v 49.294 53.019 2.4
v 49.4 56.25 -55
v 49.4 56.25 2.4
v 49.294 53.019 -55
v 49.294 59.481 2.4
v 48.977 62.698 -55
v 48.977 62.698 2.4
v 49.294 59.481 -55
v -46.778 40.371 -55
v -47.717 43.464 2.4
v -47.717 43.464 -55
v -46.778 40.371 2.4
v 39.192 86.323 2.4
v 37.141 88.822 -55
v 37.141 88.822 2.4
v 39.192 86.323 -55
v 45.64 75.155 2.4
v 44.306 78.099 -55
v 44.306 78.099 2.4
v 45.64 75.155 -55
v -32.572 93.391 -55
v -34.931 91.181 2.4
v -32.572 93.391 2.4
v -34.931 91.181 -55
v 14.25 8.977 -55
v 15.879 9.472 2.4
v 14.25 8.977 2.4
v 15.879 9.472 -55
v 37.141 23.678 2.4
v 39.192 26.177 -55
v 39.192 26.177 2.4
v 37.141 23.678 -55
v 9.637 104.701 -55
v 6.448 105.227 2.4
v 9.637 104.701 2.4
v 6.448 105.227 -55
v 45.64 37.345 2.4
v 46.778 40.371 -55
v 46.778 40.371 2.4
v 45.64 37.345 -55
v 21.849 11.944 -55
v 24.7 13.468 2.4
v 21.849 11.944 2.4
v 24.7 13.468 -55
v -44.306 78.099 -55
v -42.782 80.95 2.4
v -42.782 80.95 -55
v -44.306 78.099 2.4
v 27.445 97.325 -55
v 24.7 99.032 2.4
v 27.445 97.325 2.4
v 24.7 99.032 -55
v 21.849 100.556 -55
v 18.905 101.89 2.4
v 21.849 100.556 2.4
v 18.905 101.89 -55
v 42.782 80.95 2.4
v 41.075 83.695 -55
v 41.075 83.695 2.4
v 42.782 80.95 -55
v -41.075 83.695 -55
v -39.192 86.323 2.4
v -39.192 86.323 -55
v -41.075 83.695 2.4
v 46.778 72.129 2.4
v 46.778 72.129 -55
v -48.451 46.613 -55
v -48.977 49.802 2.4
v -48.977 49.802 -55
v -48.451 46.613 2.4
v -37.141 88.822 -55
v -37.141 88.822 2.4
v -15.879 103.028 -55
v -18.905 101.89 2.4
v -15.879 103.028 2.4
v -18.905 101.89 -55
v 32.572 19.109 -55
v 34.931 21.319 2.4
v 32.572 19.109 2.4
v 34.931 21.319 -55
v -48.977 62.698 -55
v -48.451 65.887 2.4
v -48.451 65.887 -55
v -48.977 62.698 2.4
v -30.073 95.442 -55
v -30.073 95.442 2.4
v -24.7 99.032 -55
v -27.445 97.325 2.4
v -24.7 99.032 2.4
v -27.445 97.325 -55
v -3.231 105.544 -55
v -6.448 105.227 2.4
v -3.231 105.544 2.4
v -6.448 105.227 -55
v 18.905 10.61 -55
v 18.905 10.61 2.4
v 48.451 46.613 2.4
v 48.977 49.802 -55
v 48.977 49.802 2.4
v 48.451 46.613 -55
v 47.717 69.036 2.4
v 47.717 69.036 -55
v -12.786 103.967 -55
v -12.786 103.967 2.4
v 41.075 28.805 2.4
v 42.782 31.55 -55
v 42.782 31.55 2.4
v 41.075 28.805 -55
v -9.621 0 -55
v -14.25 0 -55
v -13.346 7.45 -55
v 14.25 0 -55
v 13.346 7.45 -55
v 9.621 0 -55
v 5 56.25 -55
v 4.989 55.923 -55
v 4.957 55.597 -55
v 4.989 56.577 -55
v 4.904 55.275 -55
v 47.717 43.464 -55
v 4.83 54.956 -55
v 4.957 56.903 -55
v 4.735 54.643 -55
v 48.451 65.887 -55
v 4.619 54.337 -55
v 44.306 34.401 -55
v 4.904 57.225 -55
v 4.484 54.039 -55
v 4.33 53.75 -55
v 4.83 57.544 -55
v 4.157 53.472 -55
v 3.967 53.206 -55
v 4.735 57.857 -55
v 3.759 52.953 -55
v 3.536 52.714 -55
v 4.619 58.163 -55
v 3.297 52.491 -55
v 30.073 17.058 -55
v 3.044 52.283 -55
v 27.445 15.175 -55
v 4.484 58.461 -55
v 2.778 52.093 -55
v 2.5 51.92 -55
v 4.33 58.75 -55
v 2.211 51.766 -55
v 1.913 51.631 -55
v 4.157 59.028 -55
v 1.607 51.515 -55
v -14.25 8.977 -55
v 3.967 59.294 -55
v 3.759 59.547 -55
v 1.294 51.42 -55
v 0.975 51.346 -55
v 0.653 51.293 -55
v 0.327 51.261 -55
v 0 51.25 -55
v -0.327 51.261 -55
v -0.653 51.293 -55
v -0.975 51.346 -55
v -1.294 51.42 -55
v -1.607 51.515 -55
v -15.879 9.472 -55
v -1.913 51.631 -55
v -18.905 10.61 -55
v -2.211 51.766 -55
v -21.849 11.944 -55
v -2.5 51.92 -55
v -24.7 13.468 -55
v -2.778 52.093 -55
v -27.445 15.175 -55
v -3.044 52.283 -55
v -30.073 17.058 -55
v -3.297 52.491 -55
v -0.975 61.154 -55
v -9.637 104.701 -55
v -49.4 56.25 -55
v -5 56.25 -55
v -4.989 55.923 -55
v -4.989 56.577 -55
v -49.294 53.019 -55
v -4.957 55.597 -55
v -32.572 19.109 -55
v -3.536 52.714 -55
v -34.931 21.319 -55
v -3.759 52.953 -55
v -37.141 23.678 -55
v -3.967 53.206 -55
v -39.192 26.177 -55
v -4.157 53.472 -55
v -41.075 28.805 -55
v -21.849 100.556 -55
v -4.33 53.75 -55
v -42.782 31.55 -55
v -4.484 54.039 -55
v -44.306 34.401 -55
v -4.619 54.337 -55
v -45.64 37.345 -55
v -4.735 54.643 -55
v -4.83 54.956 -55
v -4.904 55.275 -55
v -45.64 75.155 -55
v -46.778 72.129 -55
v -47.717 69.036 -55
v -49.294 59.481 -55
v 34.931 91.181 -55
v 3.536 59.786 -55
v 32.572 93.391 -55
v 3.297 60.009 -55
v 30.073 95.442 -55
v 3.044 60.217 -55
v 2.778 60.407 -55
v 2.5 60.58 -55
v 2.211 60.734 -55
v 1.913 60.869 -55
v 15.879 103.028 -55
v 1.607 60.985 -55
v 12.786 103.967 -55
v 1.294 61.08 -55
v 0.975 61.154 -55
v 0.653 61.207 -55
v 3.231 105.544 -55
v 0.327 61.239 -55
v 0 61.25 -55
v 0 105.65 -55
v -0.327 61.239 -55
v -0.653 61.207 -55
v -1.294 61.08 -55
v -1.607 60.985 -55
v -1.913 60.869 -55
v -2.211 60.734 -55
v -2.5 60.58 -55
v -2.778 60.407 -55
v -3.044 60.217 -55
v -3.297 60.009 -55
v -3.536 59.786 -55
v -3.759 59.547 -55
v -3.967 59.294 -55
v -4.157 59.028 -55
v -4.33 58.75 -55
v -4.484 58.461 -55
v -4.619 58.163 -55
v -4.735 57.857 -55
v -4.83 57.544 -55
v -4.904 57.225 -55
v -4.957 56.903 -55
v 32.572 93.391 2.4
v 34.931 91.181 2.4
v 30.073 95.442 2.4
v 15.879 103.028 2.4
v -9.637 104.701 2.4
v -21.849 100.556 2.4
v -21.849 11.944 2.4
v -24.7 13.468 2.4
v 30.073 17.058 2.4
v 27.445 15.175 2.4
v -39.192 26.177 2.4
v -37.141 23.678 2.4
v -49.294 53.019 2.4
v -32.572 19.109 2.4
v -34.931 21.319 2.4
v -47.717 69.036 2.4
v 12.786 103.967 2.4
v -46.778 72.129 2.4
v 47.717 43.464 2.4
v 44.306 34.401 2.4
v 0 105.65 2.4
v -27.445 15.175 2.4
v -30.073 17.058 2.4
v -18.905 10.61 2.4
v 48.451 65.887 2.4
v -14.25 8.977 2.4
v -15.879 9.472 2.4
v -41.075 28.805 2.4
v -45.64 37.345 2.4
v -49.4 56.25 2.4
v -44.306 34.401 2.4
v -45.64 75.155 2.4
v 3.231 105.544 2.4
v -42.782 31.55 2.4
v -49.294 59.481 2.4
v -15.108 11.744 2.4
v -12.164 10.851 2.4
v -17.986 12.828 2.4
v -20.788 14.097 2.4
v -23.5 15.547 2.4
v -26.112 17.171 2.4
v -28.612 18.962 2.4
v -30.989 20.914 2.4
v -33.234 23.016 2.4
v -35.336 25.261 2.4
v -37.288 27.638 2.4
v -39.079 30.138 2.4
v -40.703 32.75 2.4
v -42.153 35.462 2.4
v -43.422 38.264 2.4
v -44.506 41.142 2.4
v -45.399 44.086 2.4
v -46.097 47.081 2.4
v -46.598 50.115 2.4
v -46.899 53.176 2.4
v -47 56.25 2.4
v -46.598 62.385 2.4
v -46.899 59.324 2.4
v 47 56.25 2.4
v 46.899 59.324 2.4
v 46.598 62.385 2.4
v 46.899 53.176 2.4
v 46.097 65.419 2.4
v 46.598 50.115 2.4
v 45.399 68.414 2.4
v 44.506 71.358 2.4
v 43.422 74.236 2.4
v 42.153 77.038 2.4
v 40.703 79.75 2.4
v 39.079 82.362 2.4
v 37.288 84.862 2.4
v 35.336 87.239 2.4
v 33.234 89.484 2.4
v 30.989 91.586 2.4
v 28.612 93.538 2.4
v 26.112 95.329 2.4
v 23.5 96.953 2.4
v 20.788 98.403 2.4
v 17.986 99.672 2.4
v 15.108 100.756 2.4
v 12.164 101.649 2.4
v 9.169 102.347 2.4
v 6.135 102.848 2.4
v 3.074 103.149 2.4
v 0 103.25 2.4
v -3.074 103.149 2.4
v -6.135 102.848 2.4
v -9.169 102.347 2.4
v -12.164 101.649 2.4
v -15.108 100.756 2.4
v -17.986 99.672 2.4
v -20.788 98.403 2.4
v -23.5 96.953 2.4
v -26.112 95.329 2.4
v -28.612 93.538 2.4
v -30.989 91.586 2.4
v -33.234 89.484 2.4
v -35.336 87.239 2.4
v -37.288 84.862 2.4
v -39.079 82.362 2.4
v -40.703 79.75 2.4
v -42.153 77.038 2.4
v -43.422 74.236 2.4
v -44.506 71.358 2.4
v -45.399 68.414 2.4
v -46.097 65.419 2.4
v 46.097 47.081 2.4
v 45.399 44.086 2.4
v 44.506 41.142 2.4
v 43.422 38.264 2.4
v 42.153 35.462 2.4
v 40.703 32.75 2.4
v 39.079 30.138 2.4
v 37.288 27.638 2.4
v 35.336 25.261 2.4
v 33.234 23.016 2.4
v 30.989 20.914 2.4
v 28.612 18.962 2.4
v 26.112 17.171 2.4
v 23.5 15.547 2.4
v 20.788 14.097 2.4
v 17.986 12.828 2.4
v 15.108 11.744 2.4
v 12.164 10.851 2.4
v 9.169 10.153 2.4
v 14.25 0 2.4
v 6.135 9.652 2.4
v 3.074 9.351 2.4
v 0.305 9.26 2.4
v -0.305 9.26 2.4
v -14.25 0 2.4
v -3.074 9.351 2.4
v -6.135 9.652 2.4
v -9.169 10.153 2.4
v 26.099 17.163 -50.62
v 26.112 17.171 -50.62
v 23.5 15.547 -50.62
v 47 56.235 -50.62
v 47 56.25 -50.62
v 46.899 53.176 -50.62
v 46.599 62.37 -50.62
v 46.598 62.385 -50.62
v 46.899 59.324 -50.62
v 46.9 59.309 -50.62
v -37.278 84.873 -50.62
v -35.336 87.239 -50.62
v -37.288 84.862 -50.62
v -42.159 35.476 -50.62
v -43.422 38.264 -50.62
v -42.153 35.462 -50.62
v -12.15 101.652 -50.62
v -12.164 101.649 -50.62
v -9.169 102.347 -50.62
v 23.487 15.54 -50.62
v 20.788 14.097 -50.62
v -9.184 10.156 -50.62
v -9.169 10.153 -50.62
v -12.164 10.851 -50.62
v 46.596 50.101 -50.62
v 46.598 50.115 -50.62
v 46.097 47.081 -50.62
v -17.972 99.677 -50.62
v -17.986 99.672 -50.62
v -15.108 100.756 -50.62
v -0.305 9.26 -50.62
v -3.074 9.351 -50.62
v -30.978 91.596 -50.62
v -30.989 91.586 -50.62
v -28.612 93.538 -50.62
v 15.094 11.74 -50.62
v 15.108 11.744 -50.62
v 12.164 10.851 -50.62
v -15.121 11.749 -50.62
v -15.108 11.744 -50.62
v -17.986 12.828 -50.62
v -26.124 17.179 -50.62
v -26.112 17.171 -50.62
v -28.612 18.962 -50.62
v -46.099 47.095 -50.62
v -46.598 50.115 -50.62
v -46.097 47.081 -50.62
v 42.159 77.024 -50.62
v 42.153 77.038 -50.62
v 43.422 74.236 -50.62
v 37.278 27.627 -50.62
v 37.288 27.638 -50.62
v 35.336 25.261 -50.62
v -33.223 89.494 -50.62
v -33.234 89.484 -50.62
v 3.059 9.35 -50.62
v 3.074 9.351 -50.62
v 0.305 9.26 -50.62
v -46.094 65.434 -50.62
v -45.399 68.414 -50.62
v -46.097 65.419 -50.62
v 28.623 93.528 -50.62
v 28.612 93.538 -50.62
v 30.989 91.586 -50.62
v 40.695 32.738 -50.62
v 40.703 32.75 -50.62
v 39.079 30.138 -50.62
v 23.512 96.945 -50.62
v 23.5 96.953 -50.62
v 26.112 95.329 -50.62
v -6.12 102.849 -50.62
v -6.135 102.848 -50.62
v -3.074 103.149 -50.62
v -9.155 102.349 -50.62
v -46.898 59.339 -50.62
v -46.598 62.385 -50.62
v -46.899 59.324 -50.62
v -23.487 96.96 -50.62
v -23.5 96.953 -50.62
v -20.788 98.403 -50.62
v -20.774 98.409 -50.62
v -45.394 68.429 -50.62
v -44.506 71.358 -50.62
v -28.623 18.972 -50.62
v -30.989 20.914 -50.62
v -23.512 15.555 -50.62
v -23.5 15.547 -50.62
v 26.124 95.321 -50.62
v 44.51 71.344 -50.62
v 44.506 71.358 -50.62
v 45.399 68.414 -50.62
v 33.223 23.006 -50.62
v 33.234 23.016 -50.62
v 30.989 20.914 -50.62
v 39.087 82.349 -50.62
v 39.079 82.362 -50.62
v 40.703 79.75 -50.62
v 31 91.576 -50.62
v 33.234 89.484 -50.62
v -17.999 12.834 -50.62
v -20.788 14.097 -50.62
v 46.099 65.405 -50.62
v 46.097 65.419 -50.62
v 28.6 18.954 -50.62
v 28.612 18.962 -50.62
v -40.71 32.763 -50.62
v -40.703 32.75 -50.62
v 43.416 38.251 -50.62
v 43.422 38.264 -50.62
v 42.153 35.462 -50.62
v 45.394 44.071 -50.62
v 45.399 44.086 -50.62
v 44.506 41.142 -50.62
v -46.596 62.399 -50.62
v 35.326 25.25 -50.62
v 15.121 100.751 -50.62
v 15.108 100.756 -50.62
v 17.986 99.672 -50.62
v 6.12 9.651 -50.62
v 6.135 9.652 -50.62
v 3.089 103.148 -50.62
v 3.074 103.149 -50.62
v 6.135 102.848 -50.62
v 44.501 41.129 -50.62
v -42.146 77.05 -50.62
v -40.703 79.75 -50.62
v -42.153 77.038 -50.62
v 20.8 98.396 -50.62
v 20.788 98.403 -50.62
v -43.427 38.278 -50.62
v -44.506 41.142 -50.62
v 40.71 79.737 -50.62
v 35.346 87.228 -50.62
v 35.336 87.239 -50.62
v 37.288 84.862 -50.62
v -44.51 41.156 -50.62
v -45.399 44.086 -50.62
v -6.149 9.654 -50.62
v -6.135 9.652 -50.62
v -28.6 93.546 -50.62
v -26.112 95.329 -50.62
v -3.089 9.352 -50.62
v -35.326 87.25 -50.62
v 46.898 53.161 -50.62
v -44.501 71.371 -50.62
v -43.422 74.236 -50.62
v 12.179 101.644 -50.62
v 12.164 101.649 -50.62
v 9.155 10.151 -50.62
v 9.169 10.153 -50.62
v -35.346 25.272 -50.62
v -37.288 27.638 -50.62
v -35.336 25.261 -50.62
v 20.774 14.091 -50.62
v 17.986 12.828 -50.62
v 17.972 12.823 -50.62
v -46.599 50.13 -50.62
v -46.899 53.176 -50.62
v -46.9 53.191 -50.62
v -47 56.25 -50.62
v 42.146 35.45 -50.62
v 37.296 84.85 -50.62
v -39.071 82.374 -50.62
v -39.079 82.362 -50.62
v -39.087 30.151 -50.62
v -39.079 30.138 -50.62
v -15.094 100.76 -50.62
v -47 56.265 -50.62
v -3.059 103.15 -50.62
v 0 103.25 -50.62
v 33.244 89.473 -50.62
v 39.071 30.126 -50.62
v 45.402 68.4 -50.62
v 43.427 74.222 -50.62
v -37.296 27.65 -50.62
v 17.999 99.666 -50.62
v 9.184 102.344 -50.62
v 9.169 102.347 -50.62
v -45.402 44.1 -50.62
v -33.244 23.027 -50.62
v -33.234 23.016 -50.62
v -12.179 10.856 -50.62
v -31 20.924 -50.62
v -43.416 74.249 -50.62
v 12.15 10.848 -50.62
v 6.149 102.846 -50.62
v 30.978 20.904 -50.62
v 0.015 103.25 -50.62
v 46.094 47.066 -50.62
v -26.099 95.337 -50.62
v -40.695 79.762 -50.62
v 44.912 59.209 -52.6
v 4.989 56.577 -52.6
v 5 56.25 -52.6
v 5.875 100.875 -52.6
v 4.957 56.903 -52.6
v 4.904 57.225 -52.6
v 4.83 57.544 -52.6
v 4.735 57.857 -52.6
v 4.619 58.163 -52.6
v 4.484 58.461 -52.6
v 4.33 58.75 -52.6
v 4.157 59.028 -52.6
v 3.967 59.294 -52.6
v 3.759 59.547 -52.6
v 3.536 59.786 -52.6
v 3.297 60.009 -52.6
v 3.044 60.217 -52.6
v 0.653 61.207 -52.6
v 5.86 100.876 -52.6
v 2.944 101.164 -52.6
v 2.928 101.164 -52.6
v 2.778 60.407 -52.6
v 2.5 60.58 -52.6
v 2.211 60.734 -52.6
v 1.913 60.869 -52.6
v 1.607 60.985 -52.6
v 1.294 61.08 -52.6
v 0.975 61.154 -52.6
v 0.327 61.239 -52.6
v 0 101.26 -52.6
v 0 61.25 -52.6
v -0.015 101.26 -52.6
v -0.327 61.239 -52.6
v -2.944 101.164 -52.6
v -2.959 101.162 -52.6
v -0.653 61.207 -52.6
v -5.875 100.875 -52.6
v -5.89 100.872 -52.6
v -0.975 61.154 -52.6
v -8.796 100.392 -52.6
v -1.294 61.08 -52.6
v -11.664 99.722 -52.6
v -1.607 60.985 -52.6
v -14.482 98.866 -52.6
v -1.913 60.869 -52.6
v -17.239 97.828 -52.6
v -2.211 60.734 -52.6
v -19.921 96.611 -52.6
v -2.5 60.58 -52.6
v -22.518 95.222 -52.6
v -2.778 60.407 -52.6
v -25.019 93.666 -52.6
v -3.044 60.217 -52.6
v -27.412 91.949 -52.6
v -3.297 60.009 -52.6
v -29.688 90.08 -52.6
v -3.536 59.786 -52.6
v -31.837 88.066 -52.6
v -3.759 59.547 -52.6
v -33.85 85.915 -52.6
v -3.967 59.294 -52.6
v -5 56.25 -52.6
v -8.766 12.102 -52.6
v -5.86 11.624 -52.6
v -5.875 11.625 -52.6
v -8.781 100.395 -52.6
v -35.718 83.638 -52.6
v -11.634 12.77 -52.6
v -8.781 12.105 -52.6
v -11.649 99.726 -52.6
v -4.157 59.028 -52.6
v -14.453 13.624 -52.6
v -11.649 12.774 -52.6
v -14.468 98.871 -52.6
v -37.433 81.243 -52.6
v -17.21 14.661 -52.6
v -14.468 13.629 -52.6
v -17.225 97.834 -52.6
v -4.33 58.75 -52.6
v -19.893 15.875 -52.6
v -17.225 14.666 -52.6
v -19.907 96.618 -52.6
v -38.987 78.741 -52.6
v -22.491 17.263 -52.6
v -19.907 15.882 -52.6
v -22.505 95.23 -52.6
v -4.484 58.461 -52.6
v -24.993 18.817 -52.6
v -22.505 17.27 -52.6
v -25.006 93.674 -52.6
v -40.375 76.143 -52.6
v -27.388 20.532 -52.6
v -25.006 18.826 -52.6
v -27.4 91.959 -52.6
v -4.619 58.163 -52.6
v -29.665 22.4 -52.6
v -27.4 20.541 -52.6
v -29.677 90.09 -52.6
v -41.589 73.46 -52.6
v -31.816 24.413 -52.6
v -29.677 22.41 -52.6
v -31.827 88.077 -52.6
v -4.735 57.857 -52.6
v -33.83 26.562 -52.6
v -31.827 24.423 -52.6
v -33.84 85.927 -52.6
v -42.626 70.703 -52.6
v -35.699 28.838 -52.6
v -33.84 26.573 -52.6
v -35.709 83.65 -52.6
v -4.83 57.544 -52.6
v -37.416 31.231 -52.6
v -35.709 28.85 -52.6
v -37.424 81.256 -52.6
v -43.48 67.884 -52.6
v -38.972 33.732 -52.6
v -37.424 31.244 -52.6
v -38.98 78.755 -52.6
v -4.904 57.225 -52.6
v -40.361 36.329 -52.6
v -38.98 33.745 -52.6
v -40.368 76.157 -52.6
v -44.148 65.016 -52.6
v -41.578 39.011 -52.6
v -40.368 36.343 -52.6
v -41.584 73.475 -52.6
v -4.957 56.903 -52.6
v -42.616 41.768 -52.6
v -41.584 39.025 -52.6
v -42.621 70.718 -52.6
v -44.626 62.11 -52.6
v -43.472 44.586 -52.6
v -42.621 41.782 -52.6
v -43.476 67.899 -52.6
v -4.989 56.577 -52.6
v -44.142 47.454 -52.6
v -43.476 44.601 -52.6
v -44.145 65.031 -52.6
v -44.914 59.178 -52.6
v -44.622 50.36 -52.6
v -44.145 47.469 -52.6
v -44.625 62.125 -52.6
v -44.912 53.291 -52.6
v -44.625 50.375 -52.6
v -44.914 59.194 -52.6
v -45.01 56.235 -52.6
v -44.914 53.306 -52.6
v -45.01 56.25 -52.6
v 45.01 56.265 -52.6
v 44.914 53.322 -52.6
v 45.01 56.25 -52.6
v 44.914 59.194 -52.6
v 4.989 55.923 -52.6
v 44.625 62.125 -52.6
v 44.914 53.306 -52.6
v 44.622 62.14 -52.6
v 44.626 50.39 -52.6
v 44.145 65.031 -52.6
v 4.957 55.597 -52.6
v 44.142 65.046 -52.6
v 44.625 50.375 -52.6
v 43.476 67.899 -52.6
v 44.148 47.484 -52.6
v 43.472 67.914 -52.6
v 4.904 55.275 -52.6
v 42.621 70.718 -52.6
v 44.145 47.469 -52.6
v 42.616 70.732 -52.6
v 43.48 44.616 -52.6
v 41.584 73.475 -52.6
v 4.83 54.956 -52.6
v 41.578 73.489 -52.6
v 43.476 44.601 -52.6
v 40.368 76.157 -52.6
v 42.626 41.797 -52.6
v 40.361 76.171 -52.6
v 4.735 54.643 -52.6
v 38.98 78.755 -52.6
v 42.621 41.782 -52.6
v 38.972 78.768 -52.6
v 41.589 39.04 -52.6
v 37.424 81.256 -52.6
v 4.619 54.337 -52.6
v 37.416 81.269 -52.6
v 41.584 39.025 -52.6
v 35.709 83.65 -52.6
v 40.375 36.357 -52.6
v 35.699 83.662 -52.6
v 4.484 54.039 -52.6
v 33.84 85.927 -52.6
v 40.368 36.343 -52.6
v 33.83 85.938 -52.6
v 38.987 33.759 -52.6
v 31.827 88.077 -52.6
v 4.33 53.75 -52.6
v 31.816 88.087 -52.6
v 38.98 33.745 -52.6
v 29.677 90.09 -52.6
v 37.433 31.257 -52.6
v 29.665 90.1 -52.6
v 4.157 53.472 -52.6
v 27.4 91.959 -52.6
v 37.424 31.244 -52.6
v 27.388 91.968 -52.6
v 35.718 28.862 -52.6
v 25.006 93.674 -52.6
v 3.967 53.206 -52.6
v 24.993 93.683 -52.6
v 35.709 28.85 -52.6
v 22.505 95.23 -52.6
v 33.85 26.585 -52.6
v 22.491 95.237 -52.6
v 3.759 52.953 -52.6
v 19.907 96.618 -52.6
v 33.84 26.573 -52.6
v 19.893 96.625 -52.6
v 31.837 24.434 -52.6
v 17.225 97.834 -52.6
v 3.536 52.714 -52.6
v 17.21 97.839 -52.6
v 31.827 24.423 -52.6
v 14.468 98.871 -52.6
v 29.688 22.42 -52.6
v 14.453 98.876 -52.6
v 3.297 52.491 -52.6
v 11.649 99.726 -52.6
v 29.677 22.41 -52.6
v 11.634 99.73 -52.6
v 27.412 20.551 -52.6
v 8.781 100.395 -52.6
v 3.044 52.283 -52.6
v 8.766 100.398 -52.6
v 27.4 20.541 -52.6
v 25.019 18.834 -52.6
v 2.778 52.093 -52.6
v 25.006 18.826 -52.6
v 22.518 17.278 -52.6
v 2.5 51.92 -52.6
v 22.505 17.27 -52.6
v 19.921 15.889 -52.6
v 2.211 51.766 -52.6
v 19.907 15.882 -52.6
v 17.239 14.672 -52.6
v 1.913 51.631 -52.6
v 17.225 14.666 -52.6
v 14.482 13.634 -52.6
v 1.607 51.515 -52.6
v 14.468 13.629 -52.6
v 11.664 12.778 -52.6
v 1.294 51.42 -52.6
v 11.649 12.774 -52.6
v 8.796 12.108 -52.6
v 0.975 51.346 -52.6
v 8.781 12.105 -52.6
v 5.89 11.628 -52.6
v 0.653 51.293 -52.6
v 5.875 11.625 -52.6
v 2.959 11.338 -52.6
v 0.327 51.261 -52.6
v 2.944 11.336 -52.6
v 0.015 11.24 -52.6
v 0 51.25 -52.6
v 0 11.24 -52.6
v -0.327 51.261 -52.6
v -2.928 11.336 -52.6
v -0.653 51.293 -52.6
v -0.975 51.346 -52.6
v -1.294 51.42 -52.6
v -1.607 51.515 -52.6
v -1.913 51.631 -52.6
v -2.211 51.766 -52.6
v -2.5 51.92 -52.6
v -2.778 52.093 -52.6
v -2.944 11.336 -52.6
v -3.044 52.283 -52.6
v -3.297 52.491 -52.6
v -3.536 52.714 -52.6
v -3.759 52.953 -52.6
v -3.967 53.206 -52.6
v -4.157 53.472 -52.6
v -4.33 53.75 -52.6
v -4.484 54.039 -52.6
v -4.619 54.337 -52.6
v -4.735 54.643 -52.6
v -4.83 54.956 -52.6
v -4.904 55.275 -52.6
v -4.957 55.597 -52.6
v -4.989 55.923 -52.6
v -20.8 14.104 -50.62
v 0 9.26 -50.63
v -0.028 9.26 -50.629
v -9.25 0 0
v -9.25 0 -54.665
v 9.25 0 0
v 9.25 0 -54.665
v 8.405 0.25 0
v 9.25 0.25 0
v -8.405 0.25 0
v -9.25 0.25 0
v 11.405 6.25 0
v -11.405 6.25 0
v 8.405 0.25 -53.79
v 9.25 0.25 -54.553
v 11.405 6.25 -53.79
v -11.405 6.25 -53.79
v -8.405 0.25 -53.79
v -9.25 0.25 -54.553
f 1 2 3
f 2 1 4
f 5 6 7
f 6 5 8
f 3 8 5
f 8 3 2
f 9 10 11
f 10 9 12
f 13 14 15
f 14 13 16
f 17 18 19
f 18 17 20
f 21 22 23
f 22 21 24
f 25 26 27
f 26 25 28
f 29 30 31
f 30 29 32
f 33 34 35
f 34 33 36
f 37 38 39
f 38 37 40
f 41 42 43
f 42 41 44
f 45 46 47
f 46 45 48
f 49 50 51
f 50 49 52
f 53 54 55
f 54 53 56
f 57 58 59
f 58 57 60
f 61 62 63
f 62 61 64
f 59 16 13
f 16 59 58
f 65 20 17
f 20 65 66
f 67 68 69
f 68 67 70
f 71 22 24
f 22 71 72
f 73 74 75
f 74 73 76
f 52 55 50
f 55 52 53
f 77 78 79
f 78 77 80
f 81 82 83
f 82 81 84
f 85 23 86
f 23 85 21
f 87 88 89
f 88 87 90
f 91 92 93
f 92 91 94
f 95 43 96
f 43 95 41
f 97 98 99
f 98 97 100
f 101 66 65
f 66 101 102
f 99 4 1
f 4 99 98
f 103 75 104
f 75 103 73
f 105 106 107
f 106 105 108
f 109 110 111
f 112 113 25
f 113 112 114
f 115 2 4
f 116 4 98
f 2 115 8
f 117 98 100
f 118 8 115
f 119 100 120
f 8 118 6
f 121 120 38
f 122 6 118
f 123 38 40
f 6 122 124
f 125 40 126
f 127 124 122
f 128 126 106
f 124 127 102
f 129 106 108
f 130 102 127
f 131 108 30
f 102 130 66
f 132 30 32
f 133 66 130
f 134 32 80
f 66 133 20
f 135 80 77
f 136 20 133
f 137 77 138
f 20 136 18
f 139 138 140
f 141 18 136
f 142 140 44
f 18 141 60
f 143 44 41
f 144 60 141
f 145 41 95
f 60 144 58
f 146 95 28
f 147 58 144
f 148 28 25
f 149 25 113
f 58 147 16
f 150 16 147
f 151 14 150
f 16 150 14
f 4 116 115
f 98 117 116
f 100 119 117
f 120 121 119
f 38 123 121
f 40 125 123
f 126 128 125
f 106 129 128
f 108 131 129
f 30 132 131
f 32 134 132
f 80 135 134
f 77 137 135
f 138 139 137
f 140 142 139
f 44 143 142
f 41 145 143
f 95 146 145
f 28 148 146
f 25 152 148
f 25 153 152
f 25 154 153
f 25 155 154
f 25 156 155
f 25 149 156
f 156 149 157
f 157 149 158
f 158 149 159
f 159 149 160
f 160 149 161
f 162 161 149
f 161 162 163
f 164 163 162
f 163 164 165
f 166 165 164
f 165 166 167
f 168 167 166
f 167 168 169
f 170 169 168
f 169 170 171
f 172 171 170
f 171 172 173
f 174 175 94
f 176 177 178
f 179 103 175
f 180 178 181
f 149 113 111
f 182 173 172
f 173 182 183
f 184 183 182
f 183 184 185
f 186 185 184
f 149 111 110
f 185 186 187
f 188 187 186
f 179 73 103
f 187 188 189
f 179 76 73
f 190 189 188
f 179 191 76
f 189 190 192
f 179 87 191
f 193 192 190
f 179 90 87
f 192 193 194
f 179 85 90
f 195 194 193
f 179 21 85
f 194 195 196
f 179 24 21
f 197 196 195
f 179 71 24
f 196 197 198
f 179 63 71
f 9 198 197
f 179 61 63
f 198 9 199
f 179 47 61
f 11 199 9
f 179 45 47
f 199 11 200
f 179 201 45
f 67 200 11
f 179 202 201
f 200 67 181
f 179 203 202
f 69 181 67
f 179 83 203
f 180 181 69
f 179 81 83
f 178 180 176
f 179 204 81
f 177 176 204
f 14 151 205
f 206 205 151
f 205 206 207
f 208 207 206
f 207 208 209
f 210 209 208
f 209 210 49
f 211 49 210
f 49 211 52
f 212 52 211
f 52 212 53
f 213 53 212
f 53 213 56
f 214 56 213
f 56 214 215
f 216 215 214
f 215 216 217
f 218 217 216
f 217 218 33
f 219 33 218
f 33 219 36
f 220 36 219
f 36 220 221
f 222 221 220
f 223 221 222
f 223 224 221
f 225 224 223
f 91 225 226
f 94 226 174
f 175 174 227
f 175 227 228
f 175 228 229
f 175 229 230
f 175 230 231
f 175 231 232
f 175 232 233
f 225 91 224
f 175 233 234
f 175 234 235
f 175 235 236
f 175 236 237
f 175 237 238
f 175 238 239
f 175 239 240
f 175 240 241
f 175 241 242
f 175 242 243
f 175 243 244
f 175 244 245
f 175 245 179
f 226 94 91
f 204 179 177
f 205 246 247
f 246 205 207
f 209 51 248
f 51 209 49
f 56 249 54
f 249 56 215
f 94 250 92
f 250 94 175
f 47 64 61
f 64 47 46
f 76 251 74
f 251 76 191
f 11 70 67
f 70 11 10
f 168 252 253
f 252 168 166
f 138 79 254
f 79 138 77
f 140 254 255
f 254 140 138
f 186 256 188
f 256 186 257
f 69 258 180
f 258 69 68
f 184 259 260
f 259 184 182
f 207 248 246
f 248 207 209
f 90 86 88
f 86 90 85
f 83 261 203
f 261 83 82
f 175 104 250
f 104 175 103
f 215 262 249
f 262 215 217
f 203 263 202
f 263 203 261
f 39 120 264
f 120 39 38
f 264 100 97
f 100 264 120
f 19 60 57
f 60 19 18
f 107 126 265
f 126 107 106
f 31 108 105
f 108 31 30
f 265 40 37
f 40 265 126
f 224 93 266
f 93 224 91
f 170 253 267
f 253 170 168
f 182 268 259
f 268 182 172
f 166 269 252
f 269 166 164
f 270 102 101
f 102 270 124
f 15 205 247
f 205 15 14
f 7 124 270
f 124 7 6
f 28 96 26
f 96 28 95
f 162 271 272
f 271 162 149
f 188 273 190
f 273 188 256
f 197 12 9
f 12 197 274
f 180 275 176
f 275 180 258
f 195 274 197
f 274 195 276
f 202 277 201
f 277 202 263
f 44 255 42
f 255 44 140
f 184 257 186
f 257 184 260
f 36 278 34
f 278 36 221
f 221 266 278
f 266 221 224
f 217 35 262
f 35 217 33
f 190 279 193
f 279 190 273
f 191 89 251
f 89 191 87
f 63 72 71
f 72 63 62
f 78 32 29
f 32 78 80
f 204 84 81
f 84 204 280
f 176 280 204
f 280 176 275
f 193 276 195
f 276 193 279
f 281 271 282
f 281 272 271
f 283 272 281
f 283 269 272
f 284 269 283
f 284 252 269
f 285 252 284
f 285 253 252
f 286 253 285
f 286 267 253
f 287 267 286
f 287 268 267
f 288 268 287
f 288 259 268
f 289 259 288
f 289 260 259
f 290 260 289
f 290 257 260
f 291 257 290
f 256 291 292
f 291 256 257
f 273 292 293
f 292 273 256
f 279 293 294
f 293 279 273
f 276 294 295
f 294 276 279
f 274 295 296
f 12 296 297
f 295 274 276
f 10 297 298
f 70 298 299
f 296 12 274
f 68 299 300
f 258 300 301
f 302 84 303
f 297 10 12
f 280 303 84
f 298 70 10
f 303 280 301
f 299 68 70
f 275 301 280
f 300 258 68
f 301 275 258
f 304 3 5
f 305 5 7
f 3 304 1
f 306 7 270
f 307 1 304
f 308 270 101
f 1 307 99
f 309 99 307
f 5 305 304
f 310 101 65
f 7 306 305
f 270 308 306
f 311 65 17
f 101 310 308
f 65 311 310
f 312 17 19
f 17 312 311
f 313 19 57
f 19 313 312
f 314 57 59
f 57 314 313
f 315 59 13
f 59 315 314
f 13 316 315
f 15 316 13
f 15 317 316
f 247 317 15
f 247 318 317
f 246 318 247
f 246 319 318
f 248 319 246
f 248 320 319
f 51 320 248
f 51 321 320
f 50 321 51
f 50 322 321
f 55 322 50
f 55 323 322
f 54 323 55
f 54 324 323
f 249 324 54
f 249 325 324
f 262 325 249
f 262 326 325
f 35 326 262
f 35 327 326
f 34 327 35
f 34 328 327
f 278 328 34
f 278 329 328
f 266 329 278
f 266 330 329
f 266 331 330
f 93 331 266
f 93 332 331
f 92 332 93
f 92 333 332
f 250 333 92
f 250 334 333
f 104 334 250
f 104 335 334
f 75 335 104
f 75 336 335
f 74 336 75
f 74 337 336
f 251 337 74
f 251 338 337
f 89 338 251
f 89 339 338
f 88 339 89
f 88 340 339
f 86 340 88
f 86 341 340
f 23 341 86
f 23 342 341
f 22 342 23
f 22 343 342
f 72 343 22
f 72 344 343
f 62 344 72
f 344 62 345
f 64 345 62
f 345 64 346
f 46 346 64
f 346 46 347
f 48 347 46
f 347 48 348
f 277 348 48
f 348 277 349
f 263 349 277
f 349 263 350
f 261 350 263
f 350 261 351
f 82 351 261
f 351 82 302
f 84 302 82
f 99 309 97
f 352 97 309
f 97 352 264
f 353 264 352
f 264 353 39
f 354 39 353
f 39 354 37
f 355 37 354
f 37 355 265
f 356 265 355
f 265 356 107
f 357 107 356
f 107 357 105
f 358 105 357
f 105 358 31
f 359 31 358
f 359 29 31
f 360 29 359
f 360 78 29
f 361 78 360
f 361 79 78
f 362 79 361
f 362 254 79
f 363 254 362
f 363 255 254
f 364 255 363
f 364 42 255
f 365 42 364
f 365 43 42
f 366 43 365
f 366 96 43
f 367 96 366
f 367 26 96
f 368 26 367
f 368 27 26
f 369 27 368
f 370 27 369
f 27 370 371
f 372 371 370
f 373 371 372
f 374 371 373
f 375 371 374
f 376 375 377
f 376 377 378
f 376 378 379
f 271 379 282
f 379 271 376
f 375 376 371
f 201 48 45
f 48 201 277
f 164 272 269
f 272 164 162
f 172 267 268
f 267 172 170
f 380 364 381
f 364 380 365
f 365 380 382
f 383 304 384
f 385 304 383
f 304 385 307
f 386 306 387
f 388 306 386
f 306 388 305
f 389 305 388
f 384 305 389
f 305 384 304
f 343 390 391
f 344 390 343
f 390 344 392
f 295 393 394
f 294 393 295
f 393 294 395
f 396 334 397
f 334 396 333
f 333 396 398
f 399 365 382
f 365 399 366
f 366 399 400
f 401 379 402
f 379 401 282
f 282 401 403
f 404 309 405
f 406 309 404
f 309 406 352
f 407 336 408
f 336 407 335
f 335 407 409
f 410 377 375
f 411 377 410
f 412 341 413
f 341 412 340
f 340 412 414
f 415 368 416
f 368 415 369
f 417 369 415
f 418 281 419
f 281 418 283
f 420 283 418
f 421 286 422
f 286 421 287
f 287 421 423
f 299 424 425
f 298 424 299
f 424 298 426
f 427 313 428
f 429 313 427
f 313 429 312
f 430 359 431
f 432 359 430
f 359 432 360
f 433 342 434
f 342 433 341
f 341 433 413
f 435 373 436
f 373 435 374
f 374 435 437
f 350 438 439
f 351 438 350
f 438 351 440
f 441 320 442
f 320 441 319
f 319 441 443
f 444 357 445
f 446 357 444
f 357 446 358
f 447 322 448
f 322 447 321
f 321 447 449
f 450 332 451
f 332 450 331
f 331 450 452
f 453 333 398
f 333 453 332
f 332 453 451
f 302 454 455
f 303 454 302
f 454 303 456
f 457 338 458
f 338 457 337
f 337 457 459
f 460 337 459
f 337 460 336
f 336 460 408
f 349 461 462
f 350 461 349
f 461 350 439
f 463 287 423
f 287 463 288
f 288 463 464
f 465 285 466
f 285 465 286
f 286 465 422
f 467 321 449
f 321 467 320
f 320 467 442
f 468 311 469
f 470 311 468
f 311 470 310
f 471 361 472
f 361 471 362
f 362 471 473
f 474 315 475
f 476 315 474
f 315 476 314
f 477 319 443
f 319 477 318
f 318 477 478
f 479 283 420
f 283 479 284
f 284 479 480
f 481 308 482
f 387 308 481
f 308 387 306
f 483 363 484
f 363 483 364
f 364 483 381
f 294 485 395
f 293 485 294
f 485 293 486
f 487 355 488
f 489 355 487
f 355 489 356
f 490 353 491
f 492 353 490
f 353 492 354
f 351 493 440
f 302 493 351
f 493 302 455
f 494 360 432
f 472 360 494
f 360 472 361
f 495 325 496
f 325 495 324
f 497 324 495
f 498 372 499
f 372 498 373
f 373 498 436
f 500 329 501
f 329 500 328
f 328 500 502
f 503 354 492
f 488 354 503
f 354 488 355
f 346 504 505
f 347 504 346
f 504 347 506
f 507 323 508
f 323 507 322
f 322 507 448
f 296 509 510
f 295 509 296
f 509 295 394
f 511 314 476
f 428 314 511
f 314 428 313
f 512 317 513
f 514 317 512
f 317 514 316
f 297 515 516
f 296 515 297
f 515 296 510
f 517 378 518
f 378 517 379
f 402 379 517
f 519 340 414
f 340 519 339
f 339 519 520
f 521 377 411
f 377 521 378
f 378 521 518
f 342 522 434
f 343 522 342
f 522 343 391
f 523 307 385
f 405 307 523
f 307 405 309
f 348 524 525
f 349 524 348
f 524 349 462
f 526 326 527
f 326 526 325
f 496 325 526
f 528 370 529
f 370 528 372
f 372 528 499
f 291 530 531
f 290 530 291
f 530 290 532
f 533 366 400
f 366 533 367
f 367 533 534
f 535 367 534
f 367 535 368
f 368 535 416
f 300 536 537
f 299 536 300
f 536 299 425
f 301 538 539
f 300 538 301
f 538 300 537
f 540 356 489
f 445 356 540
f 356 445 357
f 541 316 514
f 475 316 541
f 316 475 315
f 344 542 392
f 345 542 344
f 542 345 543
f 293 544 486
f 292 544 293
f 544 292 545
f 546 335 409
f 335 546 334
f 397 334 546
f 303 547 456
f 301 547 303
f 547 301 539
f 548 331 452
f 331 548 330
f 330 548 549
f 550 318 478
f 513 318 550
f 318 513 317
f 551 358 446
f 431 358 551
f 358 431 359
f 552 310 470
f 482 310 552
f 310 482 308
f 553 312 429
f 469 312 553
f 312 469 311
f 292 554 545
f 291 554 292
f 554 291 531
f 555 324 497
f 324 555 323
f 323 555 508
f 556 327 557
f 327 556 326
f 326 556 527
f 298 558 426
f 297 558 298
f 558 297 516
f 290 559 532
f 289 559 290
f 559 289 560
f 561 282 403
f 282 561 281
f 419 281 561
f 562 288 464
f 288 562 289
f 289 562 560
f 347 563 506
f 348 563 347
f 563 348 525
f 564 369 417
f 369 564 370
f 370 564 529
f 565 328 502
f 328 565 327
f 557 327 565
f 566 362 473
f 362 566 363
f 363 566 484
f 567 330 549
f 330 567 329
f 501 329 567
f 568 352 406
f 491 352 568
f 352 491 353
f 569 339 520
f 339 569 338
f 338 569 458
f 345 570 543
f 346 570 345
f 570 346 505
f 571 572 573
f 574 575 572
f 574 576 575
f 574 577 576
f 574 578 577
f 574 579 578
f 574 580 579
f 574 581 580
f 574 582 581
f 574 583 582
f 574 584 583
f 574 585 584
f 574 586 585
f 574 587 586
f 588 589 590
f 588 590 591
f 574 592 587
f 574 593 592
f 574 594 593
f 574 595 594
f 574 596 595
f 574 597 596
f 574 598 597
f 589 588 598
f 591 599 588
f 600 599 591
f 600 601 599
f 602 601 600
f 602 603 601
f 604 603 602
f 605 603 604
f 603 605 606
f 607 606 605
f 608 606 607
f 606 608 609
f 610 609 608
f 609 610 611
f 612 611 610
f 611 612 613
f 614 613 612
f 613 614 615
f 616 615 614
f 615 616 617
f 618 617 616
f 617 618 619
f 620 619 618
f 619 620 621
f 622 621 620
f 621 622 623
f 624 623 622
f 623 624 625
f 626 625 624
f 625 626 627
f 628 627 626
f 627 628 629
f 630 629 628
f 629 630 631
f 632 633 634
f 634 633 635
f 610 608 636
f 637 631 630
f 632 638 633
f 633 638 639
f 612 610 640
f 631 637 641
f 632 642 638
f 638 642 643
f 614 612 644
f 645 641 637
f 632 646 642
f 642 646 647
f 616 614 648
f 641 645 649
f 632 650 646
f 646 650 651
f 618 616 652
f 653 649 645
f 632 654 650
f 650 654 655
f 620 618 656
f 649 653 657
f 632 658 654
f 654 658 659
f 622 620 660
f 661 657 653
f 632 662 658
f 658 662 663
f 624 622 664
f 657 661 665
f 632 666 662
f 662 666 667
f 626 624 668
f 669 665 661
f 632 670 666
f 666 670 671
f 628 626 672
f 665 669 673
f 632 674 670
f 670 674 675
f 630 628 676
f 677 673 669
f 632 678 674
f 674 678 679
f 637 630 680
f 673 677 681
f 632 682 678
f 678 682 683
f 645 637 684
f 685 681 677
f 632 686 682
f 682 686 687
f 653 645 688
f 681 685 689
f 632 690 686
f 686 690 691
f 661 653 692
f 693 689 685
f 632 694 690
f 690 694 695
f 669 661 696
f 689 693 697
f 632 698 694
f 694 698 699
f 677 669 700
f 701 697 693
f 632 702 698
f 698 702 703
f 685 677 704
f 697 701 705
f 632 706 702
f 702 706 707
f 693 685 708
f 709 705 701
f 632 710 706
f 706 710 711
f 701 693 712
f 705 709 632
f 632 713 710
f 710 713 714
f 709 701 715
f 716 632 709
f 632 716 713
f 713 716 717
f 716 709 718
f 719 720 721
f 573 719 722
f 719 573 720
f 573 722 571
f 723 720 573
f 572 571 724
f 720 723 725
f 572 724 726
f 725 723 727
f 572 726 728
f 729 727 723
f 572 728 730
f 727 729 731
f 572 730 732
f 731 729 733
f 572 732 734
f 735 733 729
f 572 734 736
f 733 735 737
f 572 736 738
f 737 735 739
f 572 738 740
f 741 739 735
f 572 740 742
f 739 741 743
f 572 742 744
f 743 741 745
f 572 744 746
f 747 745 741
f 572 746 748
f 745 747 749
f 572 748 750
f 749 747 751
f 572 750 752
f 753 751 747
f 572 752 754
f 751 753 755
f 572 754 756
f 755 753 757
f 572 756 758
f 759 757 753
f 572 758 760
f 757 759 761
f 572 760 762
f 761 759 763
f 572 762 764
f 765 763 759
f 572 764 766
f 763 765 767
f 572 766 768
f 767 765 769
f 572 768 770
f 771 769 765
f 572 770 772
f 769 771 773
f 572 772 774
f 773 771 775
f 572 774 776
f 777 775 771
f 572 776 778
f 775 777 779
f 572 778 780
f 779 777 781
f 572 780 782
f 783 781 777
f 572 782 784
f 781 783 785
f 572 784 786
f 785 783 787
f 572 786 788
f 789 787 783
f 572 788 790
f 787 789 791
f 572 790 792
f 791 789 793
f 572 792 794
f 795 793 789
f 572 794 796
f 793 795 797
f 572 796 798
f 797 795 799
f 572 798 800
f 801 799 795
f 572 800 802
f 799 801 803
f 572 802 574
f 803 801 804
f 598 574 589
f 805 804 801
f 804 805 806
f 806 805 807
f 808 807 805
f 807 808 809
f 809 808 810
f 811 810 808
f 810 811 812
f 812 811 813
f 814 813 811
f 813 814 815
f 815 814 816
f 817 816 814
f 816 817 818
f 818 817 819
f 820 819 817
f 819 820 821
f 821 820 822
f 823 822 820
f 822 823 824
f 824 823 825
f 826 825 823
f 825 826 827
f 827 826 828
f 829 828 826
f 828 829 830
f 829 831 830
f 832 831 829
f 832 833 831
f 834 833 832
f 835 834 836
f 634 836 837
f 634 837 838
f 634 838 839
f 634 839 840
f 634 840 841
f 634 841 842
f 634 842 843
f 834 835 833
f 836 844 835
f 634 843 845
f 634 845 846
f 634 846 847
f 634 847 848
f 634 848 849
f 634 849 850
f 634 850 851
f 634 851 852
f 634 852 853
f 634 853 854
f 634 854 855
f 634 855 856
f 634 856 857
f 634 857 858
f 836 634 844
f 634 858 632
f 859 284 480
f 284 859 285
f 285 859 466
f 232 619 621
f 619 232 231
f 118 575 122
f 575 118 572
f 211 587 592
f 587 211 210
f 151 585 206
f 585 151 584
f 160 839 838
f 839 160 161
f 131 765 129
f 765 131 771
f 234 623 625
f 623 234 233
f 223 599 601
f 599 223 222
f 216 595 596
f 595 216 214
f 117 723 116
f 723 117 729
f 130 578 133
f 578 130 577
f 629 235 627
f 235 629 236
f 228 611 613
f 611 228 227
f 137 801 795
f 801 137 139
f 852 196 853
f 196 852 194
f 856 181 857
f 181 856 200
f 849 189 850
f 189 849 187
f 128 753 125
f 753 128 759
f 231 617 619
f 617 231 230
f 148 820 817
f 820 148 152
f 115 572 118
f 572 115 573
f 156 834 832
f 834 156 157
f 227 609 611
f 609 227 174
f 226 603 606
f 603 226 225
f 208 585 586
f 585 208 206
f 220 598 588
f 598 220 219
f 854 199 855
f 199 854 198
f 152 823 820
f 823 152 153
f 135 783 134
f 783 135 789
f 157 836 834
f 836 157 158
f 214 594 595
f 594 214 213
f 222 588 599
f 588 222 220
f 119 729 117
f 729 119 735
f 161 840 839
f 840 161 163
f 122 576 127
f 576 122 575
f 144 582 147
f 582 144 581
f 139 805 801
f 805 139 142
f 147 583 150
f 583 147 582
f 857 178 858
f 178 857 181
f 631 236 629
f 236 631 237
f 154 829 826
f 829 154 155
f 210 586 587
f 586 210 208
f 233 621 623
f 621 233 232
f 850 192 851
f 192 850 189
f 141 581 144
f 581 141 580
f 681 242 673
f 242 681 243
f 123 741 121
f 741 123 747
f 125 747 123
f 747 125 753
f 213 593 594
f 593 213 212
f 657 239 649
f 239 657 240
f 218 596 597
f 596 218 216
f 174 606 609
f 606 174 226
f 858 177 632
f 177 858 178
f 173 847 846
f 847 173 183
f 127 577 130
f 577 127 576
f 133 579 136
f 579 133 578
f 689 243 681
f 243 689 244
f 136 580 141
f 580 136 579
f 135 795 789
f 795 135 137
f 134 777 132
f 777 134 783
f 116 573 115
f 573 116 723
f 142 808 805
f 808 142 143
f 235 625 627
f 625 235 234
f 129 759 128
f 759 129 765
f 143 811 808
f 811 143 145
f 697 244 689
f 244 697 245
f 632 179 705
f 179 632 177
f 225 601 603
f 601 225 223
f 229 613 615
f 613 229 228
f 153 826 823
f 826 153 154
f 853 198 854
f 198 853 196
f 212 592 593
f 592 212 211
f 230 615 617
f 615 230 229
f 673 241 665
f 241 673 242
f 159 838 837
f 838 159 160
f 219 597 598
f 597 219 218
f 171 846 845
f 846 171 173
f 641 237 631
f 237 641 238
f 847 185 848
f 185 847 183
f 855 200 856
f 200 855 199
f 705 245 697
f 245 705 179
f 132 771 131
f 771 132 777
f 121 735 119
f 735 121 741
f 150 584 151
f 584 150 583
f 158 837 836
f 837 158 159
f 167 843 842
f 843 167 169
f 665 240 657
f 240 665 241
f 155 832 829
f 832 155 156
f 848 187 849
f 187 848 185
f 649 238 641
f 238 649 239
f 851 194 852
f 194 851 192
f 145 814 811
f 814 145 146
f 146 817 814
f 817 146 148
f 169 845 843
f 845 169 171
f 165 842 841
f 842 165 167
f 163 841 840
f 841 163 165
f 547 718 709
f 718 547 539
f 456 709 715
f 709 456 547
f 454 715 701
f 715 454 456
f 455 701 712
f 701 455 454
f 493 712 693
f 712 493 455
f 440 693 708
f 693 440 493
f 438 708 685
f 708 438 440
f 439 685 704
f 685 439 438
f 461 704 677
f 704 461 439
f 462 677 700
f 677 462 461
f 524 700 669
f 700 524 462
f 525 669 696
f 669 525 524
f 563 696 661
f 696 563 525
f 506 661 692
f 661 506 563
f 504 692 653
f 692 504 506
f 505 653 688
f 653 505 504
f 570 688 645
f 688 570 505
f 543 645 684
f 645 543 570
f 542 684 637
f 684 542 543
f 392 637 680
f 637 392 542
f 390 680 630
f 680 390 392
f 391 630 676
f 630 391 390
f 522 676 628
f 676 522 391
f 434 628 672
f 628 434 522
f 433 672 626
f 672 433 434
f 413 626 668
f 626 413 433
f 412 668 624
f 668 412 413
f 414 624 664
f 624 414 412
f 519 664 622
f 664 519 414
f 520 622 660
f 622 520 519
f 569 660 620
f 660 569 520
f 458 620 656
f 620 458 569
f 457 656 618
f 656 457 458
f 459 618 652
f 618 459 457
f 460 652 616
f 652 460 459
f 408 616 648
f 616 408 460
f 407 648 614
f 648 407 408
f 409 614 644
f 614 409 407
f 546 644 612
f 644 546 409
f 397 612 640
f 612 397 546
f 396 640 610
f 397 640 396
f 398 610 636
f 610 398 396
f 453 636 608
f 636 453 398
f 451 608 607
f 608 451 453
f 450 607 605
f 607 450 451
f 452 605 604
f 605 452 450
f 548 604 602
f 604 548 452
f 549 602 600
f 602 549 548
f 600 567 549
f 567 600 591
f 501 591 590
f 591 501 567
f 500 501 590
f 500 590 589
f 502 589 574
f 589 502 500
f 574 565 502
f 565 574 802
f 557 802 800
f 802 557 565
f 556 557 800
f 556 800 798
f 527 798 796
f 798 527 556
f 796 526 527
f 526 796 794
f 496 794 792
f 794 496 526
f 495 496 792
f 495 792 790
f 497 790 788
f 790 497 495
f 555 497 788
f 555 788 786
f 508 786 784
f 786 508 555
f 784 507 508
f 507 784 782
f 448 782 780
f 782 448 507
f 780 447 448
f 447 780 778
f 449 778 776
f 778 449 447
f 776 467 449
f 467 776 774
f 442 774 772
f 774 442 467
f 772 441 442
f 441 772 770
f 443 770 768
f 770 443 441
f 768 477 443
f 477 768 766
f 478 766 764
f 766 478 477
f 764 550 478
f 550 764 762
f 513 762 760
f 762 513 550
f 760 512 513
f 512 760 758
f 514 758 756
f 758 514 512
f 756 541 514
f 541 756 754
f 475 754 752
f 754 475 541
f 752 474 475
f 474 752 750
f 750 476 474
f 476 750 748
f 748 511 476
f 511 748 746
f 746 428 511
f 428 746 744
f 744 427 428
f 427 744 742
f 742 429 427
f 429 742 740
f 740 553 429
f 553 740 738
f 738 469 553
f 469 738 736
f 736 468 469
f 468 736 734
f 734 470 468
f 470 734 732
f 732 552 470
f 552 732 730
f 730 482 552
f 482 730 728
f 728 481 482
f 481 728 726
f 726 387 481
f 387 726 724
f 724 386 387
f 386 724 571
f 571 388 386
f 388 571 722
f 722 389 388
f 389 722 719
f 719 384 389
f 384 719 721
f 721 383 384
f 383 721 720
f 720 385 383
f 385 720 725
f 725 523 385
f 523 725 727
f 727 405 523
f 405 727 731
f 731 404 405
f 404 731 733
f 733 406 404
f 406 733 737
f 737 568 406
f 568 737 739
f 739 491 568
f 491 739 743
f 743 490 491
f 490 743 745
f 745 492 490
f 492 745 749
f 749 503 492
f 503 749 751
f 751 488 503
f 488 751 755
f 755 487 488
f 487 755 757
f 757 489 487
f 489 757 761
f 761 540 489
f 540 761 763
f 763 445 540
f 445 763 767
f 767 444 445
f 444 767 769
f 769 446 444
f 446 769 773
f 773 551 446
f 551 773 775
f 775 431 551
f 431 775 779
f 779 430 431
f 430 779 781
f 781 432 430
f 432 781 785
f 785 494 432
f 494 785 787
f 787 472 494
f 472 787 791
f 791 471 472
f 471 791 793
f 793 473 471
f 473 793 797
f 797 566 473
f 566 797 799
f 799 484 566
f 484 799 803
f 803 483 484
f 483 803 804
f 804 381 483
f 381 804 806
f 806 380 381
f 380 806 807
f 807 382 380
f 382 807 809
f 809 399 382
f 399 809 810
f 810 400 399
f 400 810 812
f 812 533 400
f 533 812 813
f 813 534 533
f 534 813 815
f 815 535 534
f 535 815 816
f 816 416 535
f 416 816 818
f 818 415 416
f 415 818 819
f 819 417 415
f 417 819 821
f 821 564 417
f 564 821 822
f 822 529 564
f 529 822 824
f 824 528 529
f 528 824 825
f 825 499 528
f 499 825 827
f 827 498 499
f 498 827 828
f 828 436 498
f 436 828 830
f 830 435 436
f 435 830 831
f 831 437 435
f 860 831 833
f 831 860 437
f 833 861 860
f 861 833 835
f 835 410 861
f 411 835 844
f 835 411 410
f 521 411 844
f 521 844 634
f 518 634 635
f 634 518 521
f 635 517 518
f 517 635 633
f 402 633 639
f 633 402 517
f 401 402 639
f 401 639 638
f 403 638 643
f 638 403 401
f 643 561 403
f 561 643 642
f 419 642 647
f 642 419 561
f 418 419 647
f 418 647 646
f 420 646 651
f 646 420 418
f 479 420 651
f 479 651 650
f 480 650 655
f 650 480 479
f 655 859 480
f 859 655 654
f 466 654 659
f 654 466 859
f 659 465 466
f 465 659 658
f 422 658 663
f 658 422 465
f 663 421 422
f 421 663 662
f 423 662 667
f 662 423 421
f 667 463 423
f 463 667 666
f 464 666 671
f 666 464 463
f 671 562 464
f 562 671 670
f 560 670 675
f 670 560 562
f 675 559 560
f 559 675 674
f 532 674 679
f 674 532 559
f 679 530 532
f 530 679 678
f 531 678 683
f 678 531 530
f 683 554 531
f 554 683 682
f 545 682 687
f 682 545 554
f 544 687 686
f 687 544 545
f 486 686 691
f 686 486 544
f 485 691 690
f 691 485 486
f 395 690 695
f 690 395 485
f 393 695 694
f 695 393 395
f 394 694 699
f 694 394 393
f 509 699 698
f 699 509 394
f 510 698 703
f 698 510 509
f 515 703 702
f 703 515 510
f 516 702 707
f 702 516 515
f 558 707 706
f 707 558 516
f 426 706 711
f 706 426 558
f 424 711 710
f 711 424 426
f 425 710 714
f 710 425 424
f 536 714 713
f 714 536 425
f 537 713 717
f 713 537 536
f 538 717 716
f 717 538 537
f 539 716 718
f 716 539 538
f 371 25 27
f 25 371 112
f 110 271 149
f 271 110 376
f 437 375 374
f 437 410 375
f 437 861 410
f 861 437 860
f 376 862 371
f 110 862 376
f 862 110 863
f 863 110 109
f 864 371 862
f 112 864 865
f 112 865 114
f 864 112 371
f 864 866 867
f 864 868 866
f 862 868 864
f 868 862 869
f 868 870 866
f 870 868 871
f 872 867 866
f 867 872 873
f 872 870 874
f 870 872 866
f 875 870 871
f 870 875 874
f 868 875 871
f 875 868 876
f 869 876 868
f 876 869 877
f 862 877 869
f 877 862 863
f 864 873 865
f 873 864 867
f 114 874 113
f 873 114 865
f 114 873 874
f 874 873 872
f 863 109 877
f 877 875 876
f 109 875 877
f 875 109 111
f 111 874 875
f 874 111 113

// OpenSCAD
// Bunk cup holder: hangs on a rail clip (clip.scad). Lower it onto the
// clip from above; the roof over its socket comes down on the clip's tail,
// so the weight of a cup, or a cup dropped in, pushes it on harder.
//
// floor = "flat": a flat seat so a glass or sippy cup stands level, with a
// 45 deg fillet where the floor meets the wall. floor = "cone": the floor
// tapers at 45 deg to a flat spot cone_base across, for cups with a narrow or
// rounded bottom (a flat-bottomed cup wider than the spot wedges instead).
// Both have a drain hole.
//
// Stripes (finish "striped"): stripe_part = 1 or 2 gives one color's bands,
// cut at whole-layer heights so an AMS swaps cleanly between them.
//
// Print upright as modeled, no supports: the floor and mount block sit on
// the bed; the socket roof is a short bridge.

use <rail-clip.scad>

/* [Cup] */
cup_id = 94;      // Duralex Picardie 250/310 ml are 86-90 mm across the top
depth = 55;       // floor to rim; a 90 mm glass stands about 35 mm proud
cup_wall = 2.4;
floor_t = 2.4;
fillet = 2;       // 45 deg ring where floor meets wall; the flat seat is cup_id - 2 * fillet across
drain_d = 10;
slots = "none";   // [none, both] a slot down each side from the rim, for a mug handle or little fingers
slot_w = 22;      // slot width; mug handles are mostly 10-20 mm thick
slot_keep = 20;   // solid wall kept between the floor and the slot bottom
floor = "flat";   // [flat, cone]
cone_base = 60;   // cone: the flat spot's width at the bottom

/* [Stripes] */
stripes = 3;      // [0:1:8] bands of the second color
stripe_h = 7;     // each band's height
base_band = 12;   // first-color band at the bottom, covering the floor
layer_h = 0.2;    // bands are cut at multiples of this
stripe_part = 0;  // [0, 1, 2] 0: the whole holder; 1 or 2: that color's bands only

/* [Fit] */
dt_clear = 0.25;  // dovetail clearance, from the fit test

part = "holder"; // [holder, assembly, rails, clips, mounted]

/* [Hidden] */
$fn = 96;
eps = 0.01;

ro = cup_id / 2 + cup_wall;
rim = dt_roof();                 // rim flush with the top of the socket roof
cone_h = floor == "cone" ? (cup_id - cone_base) / 2 : 0;   // 45 deg
bot = rim - depth - floor_t;
cy = dt_block_d(dt_clear) + ro - cup_wall;
echo(seat_center = [0, cy]);
assert(floor == "flat" || floor == "cone", str("cup-holder: unknown floor ", floor));
assert(floor == "flat" || (cone_base >= 30 && cone_h < depth - 15), "cup-holder: cone_base too small, or the cone is taller than the cup is deep");
assert(slots == "none" || depth - slot_keep >= 25,
       str("cup-holder: handle slots need depth >= ", slot_keep + 25, " (", slot_keep, " mm of wall under a 25 mm slot)"));
slot_bot = bot + floor_t + slot_keep;   // slot bottom, measured from the floor's top

module cup() {
  difference() {
    translate([0, cy, bot]) union() {
      translate([0, 0, cone_h]) cylinder(r = ro, h = rim - bot - cone_h);
      if (cone_h > 0) cylinder(r1 = cone_base / 2 + cup_wall * 1.414, r2 = ro, h = cone_h + eps);   // outside follows the cone
    }
    translate([0, cy, bot + floor_t]) union() {
      translate([0, 0, cone_h]) cylinder(r = cup_id / 2, h = depth + 1);
      if (cone_h > 0) cylinder(r1 = cone_base / 2, r2 = cup_id / 2, h = cone_h + eps);
    }
    translate([0, cy, bot - 1]) cylinder(d = drain_d, h = floor_t + 2);
    // handle slots, left and right, round-bottomed; upright print, so no overhang
    if (slots == "both") for (sx = [-1, 1]) translate([sx * ro, cy, 0]) hull() {
      translate([0, 0, slot_bot + slot_w / 2]) rotate([0, 90, 0]) cylinder(d = slot_w, h = cup_wall * 4, center = true);
      translate([0, 0, rim + 1]) rotate([0, 90, 0]) cylinder(d = slot_w, h = cup_wall * 4, center = true);
    }
  }
  if (floor == "flat") translate([0, cy, bot + floor_t - eps]) rotate_extrude()
    polygon([[cup_id / 2 - fillet, 0], [cup_id / 2 + eps, 0], [cup_id / 2 + eps, fillet]]);
}

// stripe bands, bottom up: base_band of color 1, then stripe_h of color 2 and of
// color 1 in turn, stripes times; the rest is color 1. Cut at whole layers.
function snap(z) = round(z / layer_h) * layer_h;
function band_z(i) = snap(bot + base_band + i * stripe_h);   // band edges above the base band
module stripe_slab(c) {
  big = 1000;
  for (i = [0 : 2 * stripes])   // edges 0..2*stripes; odd intervals are color 2
    if ((i % 2 == 0 ? 2 : 1) == c && i < 2 * stripes)
      translate([-big / 2, -big / 2, band_z(i)]) cube([big, big, band_z(i + 1) - band_z(i)]);
  if (c == 1) {
    translate([-big / 2, -big / 2, bot - big]) cube([big, big, band_z(0) - bot + big]);
    translate([-big / 2, -big / 2, band_z(2 * stripes)]) cube([big, big, big]);
  }
}
echo(stripe_top = band_z(2 * stripes), rim = rim);
assert(stripe_part == 0 || band_z(2 * stripes) <= rim - 2, "cup-holder: the stripes run past the rim; fewer or thinner stripes");

module holder_whole() { with_mounts(-bot, dt_clear) cup(); }
module holder() {
  if (stripe_part == 0) holder_whole();
  else intersection() { holder_whole(); stripe_slab(stripe_part); }
}

if (part == "assembly") bunk_assembly() holder();
else if (part == "holder") holder();
else bunk_piece(part) holder();
